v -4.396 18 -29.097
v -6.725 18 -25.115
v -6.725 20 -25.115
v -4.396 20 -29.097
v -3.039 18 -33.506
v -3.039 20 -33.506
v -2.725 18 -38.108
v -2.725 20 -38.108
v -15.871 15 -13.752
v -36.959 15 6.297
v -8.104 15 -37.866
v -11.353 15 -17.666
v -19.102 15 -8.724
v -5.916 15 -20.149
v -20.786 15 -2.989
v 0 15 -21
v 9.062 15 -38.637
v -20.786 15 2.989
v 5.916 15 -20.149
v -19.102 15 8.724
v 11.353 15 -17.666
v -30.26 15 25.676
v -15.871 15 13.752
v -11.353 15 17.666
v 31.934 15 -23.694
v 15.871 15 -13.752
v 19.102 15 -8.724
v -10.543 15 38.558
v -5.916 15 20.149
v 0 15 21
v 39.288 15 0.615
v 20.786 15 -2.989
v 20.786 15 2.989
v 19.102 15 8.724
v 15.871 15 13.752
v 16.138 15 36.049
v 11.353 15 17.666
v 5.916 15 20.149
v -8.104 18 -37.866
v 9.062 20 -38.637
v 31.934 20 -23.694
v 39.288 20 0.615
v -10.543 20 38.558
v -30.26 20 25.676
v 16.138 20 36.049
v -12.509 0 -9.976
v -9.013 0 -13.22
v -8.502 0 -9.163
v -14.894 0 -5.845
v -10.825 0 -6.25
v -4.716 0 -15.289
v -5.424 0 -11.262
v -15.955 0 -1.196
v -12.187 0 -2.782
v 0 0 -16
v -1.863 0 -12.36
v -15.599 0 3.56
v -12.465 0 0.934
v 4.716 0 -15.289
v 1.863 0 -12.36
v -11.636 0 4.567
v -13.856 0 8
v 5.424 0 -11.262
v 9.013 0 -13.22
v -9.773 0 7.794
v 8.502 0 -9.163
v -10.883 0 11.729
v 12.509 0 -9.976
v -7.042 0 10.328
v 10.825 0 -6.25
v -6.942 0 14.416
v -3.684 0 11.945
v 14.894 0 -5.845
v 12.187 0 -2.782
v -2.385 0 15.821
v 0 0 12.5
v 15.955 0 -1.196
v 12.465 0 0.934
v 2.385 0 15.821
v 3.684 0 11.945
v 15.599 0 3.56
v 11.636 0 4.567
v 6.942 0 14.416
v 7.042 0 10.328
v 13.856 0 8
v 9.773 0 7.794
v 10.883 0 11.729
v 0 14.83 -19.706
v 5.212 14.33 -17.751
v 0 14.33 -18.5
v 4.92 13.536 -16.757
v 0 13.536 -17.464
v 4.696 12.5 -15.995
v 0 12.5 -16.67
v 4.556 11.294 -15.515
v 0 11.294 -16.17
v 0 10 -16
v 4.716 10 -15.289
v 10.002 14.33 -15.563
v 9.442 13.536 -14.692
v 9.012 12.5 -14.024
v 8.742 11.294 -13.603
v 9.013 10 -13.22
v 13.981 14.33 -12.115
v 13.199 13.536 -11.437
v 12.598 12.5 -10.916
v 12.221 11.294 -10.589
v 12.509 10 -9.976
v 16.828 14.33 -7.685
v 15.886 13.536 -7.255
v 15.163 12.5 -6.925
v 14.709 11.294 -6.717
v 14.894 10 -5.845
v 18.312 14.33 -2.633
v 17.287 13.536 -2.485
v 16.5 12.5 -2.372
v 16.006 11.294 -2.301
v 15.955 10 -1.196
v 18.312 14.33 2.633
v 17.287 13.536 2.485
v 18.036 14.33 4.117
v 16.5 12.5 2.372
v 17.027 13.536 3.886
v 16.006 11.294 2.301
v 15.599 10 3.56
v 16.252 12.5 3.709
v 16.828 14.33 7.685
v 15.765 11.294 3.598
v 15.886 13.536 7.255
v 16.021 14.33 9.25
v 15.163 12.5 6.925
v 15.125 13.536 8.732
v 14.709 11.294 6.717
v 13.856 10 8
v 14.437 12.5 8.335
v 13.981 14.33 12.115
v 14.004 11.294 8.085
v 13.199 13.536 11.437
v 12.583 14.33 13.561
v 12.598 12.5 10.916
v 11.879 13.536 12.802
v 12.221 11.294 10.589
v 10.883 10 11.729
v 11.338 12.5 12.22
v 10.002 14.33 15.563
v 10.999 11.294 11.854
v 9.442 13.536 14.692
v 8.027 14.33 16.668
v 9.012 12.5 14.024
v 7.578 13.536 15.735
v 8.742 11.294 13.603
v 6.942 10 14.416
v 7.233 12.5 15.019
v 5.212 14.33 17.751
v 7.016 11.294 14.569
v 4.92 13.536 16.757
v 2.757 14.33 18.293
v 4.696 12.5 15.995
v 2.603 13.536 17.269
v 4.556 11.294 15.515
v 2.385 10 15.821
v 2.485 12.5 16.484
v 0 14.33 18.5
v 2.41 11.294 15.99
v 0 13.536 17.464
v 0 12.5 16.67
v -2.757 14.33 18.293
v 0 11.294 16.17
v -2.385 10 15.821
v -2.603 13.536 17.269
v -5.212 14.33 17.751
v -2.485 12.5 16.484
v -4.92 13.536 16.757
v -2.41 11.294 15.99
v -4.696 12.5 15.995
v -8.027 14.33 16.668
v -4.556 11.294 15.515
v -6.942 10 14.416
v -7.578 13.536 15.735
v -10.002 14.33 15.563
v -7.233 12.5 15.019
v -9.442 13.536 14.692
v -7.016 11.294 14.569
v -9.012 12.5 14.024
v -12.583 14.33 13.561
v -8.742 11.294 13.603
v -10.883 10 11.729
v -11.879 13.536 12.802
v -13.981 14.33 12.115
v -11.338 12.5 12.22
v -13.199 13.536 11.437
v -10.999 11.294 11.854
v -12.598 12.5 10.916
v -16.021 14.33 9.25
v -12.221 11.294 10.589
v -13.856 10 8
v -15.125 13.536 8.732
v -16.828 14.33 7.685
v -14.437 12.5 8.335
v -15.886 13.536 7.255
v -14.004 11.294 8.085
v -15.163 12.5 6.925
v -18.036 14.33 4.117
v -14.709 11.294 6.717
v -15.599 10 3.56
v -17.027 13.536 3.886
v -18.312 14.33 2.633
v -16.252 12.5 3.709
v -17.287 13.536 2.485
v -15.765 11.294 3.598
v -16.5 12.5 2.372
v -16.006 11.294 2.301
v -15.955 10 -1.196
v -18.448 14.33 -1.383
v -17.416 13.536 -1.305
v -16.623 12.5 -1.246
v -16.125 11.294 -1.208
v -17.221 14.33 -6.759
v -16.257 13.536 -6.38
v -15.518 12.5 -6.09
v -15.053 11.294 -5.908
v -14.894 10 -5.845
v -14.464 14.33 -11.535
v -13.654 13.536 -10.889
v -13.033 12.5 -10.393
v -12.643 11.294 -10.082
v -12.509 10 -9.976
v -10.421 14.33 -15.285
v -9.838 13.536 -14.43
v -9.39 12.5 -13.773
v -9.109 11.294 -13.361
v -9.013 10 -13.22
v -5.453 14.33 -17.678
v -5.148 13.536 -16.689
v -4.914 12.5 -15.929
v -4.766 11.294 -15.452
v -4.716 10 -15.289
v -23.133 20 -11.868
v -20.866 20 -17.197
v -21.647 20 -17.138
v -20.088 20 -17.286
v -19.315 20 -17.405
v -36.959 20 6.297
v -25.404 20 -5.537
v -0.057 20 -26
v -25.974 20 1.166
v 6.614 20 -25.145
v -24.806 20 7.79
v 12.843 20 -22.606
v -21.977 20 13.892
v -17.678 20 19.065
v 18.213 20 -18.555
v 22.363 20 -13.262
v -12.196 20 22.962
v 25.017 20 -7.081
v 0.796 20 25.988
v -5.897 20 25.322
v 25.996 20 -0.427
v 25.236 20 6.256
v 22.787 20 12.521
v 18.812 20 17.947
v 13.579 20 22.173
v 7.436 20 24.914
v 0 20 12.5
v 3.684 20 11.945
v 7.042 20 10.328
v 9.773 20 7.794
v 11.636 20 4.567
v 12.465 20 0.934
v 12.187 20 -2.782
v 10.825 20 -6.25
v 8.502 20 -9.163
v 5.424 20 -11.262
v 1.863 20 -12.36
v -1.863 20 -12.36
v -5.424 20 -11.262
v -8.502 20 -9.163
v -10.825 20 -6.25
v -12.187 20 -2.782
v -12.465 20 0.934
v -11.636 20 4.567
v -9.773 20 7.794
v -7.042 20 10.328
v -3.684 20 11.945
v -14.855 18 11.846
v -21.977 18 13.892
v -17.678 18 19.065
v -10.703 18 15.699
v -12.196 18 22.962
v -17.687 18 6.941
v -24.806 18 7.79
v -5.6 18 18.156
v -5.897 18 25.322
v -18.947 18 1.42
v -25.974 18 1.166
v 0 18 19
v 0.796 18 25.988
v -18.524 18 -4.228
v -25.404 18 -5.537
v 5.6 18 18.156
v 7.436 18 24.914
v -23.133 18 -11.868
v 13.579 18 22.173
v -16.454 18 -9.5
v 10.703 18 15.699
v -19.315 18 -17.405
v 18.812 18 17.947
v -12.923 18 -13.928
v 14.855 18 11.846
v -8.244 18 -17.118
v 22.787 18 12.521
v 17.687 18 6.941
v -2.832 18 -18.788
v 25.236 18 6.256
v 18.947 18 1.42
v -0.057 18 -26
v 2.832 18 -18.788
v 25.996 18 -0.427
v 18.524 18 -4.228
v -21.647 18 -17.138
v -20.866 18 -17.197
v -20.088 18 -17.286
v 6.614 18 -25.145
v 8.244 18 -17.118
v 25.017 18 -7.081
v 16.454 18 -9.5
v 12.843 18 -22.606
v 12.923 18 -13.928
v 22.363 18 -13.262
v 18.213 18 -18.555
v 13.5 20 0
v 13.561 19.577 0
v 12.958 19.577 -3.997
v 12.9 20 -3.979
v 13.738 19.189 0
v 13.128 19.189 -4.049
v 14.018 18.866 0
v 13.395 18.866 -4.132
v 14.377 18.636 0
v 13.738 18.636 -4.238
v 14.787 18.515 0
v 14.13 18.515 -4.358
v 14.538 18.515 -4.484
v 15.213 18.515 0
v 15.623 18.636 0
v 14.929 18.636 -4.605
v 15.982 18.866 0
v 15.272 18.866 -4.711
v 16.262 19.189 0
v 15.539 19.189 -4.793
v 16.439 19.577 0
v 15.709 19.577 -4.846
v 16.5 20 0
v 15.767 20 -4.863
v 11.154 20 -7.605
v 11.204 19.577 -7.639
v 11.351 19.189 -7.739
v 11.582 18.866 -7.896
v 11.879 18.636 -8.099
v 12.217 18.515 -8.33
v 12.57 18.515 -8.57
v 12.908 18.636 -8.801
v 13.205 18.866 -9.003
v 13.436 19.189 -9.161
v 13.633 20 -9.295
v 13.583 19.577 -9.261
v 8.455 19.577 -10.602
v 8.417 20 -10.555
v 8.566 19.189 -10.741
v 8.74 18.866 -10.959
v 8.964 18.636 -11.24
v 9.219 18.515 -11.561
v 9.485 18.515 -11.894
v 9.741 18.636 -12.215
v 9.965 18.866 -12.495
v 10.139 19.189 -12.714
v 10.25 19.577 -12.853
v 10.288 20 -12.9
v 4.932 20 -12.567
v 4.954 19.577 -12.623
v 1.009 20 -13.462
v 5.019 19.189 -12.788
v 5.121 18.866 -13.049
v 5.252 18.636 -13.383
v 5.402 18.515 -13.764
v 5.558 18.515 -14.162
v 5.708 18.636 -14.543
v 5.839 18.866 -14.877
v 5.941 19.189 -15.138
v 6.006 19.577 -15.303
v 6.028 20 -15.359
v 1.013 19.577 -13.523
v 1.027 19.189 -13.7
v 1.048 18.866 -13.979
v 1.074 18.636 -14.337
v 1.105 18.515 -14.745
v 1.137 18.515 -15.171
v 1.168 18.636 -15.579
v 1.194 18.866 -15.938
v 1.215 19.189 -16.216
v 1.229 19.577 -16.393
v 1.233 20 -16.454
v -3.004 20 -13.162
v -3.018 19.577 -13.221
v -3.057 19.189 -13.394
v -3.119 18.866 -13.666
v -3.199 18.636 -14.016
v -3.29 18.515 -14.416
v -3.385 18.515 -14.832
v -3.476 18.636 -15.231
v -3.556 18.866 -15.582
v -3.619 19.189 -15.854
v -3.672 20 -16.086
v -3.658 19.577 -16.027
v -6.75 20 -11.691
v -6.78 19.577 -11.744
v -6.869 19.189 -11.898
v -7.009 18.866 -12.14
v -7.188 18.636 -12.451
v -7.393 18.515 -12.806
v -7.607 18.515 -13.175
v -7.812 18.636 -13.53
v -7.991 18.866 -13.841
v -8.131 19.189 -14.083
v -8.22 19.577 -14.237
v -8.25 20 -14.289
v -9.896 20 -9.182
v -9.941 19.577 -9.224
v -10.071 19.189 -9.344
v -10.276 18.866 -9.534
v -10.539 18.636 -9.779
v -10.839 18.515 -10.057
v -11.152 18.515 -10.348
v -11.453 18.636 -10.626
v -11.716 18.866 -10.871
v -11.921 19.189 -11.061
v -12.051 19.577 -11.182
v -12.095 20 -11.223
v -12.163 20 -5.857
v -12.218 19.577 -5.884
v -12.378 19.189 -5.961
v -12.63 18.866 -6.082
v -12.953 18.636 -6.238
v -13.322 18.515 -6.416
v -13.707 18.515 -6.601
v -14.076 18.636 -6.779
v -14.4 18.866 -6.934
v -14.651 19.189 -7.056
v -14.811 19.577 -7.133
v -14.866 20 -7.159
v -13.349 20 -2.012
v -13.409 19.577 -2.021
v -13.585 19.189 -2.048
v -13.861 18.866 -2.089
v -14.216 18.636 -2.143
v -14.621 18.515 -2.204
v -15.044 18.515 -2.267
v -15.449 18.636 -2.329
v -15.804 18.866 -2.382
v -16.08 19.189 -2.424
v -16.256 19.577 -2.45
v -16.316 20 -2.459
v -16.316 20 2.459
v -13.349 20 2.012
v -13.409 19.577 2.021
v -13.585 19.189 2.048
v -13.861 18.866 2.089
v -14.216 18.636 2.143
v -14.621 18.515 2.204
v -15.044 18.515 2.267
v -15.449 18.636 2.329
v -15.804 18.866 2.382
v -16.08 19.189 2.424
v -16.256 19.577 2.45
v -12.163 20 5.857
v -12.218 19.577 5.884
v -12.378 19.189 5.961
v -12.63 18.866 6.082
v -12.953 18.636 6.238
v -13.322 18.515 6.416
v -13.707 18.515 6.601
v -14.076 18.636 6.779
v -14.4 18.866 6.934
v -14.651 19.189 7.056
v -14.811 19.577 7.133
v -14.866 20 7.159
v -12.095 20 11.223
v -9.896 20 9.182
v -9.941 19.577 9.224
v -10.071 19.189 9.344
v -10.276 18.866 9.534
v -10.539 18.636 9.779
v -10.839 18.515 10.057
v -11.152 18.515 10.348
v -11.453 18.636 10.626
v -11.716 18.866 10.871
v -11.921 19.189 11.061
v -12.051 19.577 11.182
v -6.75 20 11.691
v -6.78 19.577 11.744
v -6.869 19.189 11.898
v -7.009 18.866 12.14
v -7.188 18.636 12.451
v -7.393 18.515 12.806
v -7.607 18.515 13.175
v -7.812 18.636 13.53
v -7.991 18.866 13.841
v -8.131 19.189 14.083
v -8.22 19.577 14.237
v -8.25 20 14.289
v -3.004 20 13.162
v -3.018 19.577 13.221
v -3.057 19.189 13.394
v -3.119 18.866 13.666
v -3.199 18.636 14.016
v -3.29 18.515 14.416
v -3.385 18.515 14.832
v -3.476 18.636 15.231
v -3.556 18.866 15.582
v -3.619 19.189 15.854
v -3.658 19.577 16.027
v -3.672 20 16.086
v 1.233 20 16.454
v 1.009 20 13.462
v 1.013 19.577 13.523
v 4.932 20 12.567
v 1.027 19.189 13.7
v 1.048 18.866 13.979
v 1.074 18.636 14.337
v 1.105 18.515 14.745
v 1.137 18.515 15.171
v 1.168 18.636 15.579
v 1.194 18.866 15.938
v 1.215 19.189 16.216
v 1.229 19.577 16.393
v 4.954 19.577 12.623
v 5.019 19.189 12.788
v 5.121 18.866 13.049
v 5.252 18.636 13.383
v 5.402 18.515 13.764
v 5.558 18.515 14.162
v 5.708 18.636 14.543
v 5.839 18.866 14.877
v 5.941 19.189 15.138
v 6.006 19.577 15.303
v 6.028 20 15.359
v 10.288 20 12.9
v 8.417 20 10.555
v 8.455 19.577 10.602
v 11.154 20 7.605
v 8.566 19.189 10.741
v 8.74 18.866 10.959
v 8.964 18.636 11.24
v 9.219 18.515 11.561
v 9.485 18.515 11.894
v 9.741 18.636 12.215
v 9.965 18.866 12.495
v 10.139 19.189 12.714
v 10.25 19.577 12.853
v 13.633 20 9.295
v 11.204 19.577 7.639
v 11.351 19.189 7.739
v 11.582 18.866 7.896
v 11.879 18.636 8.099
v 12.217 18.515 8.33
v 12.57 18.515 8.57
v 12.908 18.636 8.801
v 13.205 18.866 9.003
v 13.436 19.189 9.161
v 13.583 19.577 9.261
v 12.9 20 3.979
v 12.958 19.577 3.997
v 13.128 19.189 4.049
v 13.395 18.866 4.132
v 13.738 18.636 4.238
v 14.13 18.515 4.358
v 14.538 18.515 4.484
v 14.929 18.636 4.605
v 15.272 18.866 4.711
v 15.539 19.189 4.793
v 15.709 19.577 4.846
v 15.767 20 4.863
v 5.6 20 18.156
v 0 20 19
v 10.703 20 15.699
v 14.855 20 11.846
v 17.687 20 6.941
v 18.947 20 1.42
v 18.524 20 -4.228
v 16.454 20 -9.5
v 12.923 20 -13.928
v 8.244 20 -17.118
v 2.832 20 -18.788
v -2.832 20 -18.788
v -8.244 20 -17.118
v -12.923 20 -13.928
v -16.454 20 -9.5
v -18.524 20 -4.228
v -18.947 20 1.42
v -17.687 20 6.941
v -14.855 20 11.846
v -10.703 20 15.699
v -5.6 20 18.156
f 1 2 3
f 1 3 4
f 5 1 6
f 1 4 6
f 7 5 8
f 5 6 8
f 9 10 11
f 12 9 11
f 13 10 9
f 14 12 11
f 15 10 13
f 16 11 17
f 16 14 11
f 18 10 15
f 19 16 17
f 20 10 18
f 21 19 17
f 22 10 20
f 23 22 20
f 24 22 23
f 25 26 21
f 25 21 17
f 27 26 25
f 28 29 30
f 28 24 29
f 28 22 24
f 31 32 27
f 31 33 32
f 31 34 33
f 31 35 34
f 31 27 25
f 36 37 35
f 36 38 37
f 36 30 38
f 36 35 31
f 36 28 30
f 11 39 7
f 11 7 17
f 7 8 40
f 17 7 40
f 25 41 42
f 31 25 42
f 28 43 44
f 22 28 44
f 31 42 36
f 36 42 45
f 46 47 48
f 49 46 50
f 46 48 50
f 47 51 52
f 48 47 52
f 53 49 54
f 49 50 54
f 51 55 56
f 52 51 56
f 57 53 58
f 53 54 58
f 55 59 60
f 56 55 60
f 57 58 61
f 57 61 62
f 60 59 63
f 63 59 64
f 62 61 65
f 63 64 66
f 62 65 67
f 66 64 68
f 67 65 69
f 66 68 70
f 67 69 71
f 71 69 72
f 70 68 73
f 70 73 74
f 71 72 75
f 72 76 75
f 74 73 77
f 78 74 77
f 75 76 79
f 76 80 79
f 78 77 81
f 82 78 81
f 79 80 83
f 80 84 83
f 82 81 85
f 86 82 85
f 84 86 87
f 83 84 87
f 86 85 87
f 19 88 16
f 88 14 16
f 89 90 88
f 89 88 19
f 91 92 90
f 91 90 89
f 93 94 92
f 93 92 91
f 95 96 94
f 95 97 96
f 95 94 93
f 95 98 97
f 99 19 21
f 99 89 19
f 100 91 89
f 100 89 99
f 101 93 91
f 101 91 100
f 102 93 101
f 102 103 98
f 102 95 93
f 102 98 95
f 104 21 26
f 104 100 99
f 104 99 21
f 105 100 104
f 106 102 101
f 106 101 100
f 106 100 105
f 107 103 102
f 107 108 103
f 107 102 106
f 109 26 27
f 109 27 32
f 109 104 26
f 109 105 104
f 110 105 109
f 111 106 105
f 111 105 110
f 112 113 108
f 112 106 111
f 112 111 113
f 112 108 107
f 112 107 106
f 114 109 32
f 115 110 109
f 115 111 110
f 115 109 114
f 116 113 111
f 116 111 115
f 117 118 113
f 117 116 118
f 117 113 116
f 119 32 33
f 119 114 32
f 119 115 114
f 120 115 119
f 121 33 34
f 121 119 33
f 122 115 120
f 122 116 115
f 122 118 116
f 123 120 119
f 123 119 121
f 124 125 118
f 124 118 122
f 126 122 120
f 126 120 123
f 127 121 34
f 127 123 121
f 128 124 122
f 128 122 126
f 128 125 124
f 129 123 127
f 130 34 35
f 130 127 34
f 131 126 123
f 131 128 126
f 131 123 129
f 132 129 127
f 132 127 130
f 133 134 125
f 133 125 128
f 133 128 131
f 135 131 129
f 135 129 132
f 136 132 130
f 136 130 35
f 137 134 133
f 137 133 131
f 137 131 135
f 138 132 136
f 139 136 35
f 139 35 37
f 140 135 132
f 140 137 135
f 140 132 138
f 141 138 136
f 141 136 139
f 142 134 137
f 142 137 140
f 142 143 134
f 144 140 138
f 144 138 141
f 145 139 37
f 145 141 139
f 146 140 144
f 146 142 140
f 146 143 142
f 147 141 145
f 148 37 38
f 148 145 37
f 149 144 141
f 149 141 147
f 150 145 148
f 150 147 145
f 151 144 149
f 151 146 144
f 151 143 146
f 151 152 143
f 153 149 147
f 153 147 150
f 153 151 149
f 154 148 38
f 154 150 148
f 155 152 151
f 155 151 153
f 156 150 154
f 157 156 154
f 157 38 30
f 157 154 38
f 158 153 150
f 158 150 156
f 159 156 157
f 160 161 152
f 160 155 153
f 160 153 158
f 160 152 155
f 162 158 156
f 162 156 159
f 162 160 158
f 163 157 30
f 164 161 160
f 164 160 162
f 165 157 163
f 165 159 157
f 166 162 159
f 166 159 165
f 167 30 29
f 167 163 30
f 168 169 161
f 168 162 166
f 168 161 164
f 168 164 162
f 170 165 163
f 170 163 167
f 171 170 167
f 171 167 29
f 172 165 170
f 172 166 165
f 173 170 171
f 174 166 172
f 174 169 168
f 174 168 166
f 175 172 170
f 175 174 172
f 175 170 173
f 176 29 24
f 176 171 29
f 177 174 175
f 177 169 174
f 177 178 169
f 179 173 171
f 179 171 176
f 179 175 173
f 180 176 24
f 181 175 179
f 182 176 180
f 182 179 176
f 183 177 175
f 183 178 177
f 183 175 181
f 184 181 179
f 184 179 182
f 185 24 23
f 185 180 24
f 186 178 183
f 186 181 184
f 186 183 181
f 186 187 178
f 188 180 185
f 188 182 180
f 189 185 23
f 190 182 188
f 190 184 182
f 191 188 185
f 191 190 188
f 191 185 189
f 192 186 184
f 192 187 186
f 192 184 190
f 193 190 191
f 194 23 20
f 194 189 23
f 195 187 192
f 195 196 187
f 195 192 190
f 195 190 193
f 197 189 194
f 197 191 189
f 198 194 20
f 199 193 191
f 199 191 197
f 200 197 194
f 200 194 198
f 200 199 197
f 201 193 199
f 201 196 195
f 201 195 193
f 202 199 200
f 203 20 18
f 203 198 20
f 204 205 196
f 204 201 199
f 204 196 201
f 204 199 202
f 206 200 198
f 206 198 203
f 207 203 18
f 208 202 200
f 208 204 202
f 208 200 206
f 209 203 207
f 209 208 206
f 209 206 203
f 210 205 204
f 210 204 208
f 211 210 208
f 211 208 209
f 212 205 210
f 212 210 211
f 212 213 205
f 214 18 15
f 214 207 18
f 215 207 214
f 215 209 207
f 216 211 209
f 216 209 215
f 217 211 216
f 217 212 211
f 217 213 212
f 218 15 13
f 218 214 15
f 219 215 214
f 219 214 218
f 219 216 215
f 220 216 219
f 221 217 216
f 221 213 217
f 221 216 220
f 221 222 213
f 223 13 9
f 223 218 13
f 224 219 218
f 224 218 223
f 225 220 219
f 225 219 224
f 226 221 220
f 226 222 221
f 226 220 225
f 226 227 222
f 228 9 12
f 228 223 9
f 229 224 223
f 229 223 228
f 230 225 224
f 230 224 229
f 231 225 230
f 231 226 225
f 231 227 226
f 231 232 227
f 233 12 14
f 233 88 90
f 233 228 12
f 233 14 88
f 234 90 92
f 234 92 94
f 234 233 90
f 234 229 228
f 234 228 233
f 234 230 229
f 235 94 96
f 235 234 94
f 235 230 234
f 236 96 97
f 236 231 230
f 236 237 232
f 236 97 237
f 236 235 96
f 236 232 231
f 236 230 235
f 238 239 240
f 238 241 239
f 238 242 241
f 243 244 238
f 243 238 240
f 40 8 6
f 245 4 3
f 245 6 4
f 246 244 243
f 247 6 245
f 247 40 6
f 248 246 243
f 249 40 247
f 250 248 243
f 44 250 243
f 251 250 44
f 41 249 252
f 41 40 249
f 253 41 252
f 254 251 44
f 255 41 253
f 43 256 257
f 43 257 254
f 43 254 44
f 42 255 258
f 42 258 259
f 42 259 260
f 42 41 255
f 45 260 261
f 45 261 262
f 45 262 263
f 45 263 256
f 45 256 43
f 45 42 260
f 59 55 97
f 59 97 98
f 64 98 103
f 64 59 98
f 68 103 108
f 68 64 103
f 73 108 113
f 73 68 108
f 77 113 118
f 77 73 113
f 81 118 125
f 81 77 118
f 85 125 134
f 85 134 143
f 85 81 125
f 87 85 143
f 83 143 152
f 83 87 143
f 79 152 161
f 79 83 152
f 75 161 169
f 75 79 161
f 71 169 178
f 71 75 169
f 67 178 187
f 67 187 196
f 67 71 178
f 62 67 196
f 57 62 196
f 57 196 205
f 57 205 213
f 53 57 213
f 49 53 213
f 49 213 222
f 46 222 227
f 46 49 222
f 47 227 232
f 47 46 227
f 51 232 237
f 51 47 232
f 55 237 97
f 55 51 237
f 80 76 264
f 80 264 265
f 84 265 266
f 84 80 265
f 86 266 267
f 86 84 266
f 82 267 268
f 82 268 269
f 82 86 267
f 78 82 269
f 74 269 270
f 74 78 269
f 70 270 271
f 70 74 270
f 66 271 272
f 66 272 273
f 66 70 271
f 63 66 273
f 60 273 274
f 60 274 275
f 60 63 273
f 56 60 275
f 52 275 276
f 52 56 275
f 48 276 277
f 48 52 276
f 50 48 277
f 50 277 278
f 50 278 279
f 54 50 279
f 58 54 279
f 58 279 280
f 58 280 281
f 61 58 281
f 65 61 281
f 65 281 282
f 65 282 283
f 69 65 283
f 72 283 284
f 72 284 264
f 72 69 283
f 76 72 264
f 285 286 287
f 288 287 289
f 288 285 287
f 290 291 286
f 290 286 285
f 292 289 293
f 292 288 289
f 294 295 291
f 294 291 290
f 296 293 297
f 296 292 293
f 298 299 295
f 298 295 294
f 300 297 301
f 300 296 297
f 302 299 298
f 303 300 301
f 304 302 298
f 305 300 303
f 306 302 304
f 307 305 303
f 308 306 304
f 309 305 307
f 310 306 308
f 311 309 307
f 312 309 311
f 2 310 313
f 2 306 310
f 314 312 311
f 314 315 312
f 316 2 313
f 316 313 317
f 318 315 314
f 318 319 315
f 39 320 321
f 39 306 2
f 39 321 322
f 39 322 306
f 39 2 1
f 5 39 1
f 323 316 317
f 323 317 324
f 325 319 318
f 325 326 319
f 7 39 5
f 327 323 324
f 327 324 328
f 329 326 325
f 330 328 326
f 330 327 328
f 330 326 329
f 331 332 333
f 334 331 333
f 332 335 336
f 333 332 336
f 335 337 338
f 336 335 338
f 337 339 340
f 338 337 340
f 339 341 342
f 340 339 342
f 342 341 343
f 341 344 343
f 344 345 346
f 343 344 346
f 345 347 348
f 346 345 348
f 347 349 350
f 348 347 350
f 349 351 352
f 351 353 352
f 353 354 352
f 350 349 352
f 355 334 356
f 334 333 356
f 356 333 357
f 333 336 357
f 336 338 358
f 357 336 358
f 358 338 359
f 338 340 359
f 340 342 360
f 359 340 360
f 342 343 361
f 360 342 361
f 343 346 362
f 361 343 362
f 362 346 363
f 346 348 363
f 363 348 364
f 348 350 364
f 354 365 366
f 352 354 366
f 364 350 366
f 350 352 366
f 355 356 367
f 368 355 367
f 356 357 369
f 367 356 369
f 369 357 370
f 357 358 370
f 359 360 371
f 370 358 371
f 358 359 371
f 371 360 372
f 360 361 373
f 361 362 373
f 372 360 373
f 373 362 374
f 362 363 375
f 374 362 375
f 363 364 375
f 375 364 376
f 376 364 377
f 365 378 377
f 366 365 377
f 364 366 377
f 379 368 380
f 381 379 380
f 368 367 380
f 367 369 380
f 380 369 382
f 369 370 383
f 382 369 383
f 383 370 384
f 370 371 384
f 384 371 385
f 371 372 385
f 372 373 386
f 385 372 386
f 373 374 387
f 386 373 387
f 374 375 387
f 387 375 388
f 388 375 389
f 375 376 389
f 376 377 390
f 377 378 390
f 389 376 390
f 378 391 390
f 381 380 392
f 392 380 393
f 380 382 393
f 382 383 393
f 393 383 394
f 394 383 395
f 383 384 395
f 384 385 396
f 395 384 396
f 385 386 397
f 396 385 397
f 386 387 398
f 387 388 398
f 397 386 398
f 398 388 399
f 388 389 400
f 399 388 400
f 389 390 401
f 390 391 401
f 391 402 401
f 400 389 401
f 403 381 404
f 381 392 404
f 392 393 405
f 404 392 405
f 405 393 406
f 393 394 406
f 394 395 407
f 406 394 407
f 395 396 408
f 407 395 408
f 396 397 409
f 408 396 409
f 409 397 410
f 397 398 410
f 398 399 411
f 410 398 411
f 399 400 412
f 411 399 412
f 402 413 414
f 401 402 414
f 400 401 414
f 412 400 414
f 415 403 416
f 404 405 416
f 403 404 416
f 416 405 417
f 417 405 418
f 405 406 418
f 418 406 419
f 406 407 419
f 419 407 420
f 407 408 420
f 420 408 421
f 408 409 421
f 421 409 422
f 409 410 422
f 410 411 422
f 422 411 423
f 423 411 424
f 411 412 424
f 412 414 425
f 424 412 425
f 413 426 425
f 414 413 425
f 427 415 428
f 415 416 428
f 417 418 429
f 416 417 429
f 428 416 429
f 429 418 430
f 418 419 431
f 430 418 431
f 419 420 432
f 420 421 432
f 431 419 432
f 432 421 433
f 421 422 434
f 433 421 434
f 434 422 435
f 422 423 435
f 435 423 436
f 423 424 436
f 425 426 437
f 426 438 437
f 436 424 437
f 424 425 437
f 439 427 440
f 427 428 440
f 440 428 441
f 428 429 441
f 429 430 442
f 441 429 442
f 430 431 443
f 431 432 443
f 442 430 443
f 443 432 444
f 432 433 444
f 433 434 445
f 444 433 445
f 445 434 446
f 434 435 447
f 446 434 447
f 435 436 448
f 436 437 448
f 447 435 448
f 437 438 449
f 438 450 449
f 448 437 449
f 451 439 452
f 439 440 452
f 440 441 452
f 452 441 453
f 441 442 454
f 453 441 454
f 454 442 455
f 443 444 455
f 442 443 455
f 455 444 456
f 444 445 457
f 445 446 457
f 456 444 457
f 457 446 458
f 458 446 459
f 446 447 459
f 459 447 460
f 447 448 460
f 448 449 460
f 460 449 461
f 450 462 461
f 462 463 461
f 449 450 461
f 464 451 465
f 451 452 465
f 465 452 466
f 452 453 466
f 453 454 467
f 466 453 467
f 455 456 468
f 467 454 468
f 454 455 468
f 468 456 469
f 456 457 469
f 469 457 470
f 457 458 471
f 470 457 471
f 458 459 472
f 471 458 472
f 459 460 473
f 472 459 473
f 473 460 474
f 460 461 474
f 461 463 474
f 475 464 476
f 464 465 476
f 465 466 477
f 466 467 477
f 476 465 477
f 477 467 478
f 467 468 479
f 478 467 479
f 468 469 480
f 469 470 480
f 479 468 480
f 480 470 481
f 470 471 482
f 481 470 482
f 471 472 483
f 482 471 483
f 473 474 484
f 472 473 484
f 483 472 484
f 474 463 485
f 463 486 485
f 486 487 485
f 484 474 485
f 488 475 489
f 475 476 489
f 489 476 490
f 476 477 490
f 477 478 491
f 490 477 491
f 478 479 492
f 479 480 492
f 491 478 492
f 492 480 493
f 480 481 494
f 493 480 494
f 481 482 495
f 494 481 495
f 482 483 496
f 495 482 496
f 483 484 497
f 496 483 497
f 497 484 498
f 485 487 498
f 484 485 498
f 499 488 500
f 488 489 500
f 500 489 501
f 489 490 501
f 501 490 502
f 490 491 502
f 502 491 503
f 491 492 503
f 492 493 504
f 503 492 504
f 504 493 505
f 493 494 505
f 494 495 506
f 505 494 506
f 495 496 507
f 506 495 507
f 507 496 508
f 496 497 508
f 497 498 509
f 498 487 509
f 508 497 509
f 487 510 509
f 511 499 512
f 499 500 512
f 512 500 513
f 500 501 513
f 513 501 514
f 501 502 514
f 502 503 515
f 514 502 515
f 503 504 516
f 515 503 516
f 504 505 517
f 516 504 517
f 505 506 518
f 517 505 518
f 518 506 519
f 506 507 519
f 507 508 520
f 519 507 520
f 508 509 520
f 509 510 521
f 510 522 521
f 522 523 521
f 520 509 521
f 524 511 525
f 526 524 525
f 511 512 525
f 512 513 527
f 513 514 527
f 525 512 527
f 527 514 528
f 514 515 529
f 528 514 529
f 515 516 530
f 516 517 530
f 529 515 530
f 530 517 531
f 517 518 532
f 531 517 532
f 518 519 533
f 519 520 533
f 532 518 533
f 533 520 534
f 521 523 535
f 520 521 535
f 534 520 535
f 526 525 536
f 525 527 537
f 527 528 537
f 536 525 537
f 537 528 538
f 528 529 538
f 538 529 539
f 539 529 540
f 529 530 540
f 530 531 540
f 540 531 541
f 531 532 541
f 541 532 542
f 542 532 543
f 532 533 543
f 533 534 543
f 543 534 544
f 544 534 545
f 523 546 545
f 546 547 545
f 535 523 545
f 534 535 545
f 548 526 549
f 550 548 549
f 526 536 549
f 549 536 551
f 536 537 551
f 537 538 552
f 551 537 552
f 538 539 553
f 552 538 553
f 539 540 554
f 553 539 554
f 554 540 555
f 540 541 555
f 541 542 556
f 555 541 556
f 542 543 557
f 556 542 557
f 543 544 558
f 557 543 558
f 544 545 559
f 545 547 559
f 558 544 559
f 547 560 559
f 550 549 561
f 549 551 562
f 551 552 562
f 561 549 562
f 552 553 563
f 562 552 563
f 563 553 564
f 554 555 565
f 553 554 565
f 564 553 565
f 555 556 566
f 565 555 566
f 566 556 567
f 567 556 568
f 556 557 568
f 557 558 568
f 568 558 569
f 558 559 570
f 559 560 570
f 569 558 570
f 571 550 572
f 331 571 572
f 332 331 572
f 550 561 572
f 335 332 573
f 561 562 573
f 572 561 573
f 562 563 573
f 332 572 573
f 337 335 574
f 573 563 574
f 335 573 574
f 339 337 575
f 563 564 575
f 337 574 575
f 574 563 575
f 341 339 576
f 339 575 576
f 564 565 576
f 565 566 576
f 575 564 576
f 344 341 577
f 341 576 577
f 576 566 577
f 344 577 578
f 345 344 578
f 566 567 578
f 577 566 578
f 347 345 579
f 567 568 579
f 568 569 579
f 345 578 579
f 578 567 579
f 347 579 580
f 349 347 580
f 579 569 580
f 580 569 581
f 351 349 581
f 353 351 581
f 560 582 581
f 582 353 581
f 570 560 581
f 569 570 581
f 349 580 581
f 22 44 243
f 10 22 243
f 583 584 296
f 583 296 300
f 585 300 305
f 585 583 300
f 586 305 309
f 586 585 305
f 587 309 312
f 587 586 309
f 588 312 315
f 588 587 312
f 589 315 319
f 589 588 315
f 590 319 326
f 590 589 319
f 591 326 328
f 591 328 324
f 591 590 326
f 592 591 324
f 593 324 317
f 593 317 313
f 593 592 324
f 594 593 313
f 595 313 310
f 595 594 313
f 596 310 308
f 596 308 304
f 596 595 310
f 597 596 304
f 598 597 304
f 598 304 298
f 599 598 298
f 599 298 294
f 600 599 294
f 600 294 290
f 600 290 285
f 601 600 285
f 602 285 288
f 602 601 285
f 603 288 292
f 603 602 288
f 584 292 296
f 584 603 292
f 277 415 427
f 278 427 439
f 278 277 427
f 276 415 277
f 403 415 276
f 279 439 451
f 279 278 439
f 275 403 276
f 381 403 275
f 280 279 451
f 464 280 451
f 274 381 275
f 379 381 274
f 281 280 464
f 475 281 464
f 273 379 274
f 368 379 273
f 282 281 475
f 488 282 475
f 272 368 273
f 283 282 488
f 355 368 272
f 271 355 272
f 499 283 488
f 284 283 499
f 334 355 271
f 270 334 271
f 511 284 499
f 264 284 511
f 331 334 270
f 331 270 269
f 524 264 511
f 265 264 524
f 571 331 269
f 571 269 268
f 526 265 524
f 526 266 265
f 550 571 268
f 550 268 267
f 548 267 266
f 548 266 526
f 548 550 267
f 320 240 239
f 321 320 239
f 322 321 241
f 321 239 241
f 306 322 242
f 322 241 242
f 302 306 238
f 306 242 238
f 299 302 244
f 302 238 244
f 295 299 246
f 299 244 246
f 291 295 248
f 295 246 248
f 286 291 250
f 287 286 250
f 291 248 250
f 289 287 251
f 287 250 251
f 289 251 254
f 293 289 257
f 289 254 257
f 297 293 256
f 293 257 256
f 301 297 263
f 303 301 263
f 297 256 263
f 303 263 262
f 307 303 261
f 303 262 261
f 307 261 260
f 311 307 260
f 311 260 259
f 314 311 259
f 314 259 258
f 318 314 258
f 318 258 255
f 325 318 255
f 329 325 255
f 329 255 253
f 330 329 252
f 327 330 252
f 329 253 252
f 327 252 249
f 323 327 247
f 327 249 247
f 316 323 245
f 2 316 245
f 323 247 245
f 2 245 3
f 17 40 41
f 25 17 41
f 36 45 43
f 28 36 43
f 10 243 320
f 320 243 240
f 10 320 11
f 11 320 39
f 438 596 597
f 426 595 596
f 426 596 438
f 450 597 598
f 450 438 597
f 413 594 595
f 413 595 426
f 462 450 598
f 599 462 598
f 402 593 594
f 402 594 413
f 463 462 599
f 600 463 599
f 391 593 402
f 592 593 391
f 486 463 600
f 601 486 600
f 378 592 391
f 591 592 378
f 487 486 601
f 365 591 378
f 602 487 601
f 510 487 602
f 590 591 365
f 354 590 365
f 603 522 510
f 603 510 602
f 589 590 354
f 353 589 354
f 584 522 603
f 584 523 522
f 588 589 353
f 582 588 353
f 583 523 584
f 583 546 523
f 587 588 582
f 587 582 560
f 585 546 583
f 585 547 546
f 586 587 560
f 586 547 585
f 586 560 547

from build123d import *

# Parameters (mm, degrees)
SKETCH_1_R            = 40
SKETCH_1_R_2          = 12.5
EXTRUDE_1_DEPTH       = 20
SKETCH_6_R            = 1.5
SKETCH_12_R           = 43.016285751
SKETCH_12_R_2         = 16
CUT_EXTRUDE_5_DEPTH   = 15
FILLET_2_R            = 5
SKETCH_14_R           = 25.999999999
SKETCH_14_R_2         = 18.999999999
CUT_EXTRUDE_3_DEPTH   = 2
CUT_EXTRUDE_4_DEPTH   = 2
CUT_EXTRUDE_5_2_DEPTH = 10


with BuildPart() as part:
    # Эскиз1 → Вытянуть1 (new body)
    with BuildSketch(Plane(origin=(0, 0, 0), x_dir=(1, 0, 0), z_dir=(0, 1, 0))):
        with Locations(Location((0, 0, 0), (0, 0, 270))):
            Circle(SKETCH_1_R)
        with Locations(Location((0, 0, 0), (0, 0, 270))):
            Circle(SKETCH_1_R_2, mode=Mode.SUBTRACT)
    extrude(amount=EXTRUDE_1_DEPTH)

    # Вырез-По траектории3: sweep along a path in Эскиз4
    with BuildLine(Plane(origin=(0, 20, 0), x_dir=(1, 0, 0), z_dir=(0, 1, 0))) as sweep_3_path:
        CenterArc((0, 0), 15, 0, 360)
    # Эскиз6 → Вырез-По траектории3 (sweep, cut)
    with BuildSketch(Plane(origin=(0, 0, 0), x_dir=(0, 0, -1), z_dir=(1, 0, 0))):
        with Locations((-15, 20)):
            Circle(SKETCH_6_R)
    sweep(path=sweep_3_path.line, mode=Mode.SUBTRACT)

    # Эскиз12 → Cut-Extrude 5 (cut)
    with BuildSketch(Plane.XZ):
        Circle(SKETCH_12_R)
        with Locations(Location((0, 0, 0), (0, 0, 270))):
            Circle(SKETCH_12_R_2, mode=Mode.SUBTRACT)
    extrude(amount=-CUT_EXTRUDE_5_DEPTH, mode=Mode.SUBTRACT)

    # Скругление2
    fillet_2_edges = [part.edges().sort_by_distance(p)[0] for p in [
        (0, 15, 16),
    ]]
    fillet(fillet_2_edges, radius=FILLET_2_R)

    # Эскиз14 → Вырез-Вытянуть3 (cut)
    with BuildSketch(Plane(origin=(0, 20, 0), x_dir=(1, 0, 0), z_dir=(0, 1, 0))):
        with Locations(Location((1.01e-07, 8.4e-08, 0), (0, 0, 270))):
            Circle(SKETCH_14_R)
        with Locations(Location((1.01e-07, 8.4e-08, 0), (0, 0, 270))):
            Circle(SKETCH_14_R_2, mode=Mode.SUBTRACT)
    extrude(amount=-CUT_EXTRUDE_3_DEPTH, mode=Mode.SUBTRACT)

    # Эскиз15 → Вырез-Вытянуть4 (cut)
    with BuildSketch(Plane(origin=(0, 20, 0), x_dir=(1, 0, 0), z_dir=(0, 1, 0))):
        with BuildLine():
            ThreePointArc((-27.297327545, 17.627292527), (-13.760291037, 55.089119116), (-35.71683723, 21.854349851))
            ThreePointArc((-35.71683723, 21.854349851), (-36.252930678, 10.287976674), (-27.297327545, 17.627292527))
        make_face()
    extrude(amount=-CUT_EXTRUDE_4_DEPTH, mode=Mode.SUBTRACT)

    # Эскиз16 → Cut-Extrude 5 2 (cut)
    with BuildSketch(Plane(origin=(0, 20, 0), x_dir=(1, 0, 0), z_dir=(0, 1, 0))):
        Polygon((-7.191454283, -44.519977242), (-37.881198424, -24.469576927), (-45.366952085, 5.371359597), (-23.143023154, 39.387971833), (7.640311576, 44.595915214), (37.770432201, 24.911131357), (45.434410754, -5.233046757), (23.11557492, -39.392615521), align=None)
        Polygon((-8.103935708, 37.866262499), (9.062062667, 38.636931735), (31.933510124, 23.694426018), (39.288073881, -0.614873657), (16.138351941, -36.048532442), (-10.543237541, -38.557583255), (-30.26042154, -25.675839099), (-36.958934768, -6.29707702), align=None, mode=Mode.SUBTRACT)
    extrude(amount=-CUT_EXTRUDE_5_2_DEPTH, mode=Mode.SUBTRACT)


solid = part.part
